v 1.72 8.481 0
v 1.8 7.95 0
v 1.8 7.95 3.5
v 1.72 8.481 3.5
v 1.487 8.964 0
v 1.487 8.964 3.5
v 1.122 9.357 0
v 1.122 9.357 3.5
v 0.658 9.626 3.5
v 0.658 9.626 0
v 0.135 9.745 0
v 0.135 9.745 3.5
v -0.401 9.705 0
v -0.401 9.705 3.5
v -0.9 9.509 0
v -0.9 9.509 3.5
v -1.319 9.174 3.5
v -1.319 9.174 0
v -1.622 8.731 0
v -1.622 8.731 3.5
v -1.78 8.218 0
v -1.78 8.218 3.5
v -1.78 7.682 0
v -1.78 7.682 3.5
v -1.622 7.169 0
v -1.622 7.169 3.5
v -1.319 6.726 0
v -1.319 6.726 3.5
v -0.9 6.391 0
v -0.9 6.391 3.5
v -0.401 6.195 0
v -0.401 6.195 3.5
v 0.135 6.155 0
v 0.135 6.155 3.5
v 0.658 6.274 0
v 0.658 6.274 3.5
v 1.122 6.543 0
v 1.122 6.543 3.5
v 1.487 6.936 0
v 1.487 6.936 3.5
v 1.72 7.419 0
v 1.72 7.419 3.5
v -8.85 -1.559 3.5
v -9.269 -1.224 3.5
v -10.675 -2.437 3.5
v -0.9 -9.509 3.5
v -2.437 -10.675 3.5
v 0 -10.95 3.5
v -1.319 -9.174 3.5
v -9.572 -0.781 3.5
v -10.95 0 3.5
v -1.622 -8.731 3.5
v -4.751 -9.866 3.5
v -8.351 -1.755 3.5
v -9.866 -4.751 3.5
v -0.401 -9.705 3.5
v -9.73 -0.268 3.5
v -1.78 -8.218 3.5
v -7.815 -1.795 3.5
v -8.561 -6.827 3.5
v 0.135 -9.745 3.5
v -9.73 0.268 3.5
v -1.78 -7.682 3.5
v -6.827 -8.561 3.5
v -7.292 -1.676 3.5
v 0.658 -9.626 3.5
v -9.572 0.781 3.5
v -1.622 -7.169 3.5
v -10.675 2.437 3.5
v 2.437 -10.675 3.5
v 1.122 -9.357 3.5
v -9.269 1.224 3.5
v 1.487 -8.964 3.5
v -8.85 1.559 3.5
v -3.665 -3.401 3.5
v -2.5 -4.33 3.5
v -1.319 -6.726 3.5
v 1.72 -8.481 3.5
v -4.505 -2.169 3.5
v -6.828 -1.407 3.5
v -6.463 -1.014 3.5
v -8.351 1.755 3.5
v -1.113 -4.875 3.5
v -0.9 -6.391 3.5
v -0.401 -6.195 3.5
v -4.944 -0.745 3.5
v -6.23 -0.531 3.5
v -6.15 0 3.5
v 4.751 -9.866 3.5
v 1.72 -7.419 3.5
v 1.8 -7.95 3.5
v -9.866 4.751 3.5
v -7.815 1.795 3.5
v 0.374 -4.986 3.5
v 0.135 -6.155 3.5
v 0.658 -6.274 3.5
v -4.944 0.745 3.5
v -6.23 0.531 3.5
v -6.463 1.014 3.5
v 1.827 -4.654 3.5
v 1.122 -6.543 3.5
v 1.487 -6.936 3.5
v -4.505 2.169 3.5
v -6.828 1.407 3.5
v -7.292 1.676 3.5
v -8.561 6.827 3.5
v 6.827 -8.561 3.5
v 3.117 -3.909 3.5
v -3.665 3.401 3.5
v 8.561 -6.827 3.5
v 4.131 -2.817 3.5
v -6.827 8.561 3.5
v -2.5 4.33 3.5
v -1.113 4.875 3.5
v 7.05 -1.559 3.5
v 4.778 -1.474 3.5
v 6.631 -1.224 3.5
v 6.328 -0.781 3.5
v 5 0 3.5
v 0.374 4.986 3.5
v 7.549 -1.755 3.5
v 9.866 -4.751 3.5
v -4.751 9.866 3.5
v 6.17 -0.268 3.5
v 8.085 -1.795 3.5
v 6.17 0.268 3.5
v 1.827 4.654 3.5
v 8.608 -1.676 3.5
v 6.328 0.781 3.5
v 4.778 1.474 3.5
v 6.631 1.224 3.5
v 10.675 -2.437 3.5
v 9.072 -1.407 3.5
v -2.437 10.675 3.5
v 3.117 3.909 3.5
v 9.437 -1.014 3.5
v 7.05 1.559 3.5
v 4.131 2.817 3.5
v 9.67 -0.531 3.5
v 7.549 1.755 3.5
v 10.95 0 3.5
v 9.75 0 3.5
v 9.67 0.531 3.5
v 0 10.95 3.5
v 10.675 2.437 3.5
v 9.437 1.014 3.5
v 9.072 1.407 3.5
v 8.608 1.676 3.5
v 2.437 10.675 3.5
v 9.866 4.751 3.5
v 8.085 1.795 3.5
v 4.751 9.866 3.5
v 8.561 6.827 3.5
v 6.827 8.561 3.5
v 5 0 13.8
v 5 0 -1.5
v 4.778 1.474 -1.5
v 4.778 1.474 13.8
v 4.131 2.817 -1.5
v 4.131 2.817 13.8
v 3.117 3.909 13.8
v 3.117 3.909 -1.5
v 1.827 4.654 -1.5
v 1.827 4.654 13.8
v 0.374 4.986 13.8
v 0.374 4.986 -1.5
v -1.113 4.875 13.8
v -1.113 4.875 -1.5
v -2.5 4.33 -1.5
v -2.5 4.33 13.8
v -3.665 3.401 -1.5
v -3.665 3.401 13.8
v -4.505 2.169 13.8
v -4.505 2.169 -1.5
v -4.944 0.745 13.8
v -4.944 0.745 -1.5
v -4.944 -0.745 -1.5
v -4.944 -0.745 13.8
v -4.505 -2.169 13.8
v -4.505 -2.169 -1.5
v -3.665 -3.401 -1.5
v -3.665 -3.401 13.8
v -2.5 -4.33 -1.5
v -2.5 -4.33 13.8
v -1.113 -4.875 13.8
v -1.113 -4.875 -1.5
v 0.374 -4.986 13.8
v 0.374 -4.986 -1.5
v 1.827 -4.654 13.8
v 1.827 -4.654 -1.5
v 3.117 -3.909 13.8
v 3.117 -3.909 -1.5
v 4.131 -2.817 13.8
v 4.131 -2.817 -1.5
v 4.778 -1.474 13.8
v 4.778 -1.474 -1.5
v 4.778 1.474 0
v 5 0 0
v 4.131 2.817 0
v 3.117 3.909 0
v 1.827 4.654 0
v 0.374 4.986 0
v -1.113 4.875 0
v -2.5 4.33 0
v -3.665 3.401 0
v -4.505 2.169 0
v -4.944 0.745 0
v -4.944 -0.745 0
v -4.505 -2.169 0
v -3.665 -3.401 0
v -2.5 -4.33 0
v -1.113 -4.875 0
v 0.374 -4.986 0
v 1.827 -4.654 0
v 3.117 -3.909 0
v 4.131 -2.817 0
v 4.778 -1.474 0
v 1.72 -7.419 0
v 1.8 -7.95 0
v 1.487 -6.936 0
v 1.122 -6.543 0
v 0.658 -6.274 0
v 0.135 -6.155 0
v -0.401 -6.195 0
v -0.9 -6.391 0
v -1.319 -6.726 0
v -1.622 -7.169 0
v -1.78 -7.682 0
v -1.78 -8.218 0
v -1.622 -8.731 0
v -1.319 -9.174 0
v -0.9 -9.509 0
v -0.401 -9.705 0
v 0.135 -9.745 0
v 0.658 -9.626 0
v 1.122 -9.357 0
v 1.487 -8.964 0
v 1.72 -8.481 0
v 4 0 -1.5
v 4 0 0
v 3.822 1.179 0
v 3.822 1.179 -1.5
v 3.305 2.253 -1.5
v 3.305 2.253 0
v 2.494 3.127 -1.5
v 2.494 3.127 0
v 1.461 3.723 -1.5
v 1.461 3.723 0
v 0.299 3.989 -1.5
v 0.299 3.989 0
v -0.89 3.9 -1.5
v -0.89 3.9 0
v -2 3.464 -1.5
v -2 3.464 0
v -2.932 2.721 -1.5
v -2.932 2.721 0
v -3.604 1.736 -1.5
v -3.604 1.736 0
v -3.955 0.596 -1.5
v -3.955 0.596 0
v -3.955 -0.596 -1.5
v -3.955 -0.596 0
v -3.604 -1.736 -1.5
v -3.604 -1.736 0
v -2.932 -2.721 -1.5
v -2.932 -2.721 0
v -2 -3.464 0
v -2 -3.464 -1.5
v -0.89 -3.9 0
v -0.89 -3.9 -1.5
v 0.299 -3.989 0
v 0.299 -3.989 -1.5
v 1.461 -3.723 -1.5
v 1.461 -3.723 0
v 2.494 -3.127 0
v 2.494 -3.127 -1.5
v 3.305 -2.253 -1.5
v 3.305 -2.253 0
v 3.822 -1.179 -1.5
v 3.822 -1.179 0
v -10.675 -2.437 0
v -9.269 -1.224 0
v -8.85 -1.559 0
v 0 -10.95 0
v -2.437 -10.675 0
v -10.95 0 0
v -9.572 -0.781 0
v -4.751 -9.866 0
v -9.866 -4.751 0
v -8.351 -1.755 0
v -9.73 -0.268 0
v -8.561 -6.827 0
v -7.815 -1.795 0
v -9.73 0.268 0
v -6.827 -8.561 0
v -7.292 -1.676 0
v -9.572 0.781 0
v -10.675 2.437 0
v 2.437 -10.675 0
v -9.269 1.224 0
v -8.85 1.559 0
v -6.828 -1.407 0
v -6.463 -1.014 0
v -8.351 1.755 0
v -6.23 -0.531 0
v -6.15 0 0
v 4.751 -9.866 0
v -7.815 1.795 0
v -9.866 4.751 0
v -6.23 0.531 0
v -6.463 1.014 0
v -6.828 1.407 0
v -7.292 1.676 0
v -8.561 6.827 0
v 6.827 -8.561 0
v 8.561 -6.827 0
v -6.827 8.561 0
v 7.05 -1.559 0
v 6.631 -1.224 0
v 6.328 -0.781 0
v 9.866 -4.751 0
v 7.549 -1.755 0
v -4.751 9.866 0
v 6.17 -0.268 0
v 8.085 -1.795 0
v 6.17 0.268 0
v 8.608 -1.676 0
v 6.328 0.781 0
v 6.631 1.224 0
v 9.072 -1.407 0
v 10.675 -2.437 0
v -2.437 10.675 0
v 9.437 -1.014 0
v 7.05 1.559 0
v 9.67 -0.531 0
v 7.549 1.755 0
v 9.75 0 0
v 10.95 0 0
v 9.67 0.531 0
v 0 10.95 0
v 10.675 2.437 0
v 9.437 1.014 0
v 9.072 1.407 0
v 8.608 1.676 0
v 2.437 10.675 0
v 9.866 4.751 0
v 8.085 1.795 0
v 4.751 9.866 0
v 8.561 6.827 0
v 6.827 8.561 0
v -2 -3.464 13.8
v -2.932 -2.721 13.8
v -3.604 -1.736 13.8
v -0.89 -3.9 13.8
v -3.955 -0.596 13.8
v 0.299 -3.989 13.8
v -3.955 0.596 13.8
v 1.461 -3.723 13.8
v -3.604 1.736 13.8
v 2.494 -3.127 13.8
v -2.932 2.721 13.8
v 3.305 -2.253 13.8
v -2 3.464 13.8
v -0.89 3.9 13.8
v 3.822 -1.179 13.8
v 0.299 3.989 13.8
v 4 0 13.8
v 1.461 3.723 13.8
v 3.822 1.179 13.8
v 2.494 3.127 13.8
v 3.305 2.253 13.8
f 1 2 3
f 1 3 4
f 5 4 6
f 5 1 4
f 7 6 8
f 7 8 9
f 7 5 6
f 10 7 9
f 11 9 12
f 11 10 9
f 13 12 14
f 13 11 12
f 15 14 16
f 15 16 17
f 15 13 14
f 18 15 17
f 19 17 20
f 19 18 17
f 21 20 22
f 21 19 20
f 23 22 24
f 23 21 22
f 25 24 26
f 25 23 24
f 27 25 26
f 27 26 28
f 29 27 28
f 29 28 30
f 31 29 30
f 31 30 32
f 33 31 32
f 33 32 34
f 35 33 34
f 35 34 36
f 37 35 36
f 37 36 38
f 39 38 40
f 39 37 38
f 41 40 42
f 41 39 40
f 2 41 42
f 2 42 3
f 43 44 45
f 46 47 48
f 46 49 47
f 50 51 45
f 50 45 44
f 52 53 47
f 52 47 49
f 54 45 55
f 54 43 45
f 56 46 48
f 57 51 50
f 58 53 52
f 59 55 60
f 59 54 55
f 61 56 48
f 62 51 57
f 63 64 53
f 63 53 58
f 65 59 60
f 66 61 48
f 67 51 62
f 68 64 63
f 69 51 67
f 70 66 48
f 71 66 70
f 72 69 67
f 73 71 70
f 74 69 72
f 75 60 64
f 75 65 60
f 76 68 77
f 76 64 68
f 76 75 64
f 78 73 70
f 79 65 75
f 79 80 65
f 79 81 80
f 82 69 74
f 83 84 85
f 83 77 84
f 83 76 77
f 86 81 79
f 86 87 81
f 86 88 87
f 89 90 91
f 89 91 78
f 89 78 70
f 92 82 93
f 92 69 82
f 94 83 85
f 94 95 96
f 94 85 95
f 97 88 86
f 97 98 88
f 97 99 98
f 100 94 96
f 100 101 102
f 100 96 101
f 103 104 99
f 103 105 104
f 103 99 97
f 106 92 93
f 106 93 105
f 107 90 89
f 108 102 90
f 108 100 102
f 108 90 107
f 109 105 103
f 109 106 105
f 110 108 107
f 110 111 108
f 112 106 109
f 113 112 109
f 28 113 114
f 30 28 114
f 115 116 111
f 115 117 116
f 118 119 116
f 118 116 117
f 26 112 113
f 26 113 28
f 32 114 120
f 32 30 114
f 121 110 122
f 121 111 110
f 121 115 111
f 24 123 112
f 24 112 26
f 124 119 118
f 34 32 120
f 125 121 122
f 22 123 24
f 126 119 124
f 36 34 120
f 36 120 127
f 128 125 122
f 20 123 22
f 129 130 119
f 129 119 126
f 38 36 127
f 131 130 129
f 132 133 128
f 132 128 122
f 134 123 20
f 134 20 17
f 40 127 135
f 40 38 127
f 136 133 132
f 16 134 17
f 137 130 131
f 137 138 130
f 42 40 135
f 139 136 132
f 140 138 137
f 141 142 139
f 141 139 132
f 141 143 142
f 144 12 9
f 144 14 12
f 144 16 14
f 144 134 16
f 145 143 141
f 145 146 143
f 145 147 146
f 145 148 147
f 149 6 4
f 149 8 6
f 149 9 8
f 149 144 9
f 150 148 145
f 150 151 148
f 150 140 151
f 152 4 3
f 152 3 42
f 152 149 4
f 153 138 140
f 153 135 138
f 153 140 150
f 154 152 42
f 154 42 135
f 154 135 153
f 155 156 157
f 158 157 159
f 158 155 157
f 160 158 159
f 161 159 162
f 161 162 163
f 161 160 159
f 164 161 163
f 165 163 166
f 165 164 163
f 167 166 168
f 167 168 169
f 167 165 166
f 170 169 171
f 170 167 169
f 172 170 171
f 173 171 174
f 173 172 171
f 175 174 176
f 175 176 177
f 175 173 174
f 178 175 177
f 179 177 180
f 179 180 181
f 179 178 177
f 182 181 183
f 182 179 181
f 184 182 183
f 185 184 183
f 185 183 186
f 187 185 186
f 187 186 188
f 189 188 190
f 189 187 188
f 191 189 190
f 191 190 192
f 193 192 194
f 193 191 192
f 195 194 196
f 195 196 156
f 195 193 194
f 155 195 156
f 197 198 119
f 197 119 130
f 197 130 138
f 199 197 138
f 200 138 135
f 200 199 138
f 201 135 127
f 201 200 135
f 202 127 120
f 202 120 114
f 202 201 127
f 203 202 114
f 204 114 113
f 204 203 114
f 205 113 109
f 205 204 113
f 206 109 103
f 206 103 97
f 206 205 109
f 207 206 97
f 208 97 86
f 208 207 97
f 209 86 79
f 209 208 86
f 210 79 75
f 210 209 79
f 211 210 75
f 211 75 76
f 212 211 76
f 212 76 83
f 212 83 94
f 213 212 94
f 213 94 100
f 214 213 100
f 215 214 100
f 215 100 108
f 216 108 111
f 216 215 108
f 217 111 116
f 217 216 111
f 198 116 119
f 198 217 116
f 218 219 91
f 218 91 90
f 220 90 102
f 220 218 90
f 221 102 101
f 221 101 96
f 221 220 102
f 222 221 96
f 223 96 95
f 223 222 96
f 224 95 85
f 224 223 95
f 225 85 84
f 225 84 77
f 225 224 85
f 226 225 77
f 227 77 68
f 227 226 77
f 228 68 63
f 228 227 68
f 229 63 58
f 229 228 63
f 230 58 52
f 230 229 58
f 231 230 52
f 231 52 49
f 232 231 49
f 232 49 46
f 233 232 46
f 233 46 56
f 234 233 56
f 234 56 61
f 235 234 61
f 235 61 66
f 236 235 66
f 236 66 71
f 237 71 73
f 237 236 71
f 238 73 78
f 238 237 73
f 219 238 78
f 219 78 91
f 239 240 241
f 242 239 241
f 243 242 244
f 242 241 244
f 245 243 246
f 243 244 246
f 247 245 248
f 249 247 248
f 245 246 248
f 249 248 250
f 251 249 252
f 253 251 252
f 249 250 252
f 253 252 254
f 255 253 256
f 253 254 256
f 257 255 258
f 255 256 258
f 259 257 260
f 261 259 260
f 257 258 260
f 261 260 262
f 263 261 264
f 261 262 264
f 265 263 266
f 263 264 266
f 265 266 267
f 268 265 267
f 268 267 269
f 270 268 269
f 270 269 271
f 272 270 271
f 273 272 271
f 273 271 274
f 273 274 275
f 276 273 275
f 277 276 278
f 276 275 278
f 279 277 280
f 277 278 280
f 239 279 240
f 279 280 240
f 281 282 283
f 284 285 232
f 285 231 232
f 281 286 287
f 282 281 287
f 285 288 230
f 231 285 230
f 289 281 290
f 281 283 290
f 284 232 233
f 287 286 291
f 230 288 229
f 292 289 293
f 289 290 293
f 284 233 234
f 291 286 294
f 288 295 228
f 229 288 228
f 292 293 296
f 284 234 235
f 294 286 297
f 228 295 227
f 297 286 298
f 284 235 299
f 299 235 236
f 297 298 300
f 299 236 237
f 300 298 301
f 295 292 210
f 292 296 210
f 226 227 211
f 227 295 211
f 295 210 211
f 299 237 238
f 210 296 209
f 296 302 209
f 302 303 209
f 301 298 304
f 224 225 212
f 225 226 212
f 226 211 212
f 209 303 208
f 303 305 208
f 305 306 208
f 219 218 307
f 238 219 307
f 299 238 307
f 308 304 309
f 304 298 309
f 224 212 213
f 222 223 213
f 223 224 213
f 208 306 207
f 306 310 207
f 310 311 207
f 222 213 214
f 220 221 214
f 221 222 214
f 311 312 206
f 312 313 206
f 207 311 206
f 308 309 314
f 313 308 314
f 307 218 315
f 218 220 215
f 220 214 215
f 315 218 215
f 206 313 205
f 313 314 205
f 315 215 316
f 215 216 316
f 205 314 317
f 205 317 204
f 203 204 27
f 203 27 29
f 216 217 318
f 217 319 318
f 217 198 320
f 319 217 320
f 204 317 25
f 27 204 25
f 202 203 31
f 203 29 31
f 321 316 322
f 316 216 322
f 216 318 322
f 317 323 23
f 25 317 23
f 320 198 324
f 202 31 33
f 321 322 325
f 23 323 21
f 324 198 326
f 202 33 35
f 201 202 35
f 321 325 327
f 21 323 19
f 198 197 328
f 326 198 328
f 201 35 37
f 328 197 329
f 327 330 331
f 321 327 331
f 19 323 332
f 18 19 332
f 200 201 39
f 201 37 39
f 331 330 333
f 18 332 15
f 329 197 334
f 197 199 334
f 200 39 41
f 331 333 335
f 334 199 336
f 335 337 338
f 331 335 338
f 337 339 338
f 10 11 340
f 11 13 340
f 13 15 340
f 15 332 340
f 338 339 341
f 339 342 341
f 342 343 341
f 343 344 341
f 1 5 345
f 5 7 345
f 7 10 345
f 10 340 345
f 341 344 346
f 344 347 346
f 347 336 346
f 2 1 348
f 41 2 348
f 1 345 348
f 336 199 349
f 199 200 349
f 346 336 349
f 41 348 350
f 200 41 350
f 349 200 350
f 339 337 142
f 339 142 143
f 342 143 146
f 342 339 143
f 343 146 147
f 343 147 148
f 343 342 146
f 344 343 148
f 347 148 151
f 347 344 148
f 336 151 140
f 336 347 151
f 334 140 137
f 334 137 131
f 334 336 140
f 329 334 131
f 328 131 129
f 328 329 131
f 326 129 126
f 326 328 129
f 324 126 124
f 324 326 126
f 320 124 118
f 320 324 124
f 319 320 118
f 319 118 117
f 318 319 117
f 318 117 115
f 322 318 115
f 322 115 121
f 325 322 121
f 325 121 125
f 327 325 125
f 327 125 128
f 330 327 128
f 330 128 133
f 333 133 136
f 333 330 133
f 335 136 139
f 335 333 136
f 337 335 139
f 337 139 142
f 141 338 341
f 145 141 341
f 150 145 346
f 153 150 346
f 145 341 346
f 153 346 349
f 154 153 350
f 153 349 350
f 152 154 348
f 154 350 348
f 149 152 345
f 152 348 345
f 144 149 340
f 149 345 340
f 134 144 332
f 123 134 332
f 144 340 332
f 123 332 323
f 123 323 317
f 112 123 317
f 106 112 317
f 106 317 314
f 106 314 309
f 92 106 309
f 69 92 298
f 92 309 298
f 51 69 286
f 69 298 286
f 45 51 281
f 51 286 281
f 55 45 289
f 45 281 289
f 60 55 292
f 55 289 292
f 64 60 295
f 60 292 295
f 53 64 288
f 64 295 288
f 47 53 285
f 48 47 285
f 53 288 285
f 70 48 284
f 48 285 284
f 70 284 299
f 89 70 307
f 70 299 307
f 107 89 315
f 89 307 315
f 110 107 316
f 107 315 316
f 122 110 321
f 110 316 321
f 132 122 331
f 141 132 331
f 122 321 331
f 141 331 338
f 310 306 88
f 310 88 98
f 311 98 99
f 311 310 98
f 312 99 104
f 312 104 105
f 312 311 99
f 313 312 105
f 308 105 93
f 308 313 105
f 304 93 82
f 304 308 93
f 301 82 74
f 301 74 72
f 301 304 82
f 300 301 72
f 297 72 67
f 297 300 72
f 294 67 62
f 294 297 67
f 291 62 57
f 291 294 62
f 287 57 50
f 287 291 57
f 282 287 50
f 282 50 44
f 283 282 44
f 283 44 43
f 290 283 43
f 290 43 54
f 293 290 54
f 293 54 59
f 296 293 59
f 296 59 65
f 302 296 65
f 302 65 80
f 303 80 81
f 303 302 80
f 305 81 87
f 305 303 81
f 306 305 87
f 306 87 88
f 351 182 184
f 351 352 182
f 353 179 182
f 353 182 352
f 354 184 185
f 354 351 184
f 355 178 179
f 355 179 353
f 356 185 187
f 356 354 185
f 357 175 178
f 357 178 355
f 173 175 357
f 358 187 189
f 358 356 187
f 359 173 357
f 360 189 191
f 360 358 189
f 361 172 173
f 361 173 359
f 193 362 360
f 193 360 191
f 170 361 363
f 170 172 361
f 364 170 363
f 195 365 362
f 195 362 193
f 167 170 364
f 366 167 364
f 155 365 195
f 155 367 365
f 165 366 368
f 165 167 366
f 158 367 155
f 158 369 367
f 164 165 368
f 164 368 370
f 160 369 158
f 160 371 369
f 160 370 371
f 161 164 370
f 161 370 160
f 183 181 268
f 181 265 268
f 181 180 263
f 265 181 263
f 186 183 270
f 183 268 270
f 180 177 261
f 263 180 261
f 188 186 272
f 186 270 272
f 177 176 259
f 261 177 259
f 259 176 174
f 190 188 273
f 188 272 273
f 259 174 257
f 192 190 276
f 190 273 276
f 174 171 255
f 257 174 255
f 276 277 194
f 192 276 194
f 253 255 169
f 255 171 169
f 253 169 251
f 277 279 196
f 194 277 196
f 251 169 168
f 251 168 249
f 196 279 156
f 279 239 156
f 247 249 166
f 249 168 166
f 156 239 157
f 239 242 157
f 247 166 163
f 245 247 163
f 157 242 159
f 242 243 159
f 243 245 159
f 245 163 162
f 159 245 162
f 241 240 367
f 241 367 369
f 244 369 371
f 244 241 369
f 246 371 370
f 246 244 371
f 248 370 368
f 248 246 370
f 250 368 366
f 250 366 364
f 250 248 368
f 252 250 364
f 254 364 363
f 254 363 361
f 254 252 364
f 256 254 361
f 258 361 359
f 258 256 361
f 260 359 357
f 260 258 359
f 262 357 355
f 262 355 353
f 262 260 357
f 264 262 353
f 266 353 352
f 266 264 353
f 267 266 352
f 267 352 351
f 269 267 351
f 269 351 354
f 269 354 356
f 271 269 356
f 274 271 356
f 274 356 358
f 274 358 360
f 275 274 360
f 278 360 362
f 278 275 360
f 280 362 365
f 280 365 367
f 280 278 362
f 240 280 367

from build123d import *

# Parameters (mm, degrees)
F0_R     = 10.95
F0_R_2   = 1.8
F0_R_3   = 5
F1_DEPTH = 3.5
F0_R_4   = 4
F2_DEPTH = 13.8
F3_DEPTH = 1.5


with BuildPart() as f1:
    # F0 (on Top) → F1 (new body)
    with BuildSketch(Plane.XY):
        Circle(F0_R)
        with Locations((0, -7.95)):
            Circle(F0_R_2, mode=Mode.SUBTRACT)
        with Locations((-7.95, 0)):
            Circle(F0_R_2, mode=Mode.SUBTRACT)
        Circle(F0_R_3, mode=Mode.SUBTRACT)
        with Locations((7.95, 0)):
            Circle(F0_R_2, mode=Mode.SUBTRACT)
        with Locations((0, 7.95)):
            Circle(F0_R_2, mode=Mode.SUBTRACT)
    extrude(amount=F1_DEPTH)


with BuildPart() as f2:
    # F0 (on Top) → F2 (new body)
    with BuildSketch(Plane.XY):
        Circle(F0_R_3)
        Circle(F0_R_4, mode=Mode.SUBTRACT)
    extrude(amount=F2_DEPTH)

    # F0 (on Top) → F3 (join)
    with BuildSketch(Plane.XY):
        Circle(F0_R_3)
        Circle(F0_R_4, mode=Mode.SUBTRACT)
    extrude(amount=-F3_DEPTH)


solid = Compound([f1.part, f2.part])
